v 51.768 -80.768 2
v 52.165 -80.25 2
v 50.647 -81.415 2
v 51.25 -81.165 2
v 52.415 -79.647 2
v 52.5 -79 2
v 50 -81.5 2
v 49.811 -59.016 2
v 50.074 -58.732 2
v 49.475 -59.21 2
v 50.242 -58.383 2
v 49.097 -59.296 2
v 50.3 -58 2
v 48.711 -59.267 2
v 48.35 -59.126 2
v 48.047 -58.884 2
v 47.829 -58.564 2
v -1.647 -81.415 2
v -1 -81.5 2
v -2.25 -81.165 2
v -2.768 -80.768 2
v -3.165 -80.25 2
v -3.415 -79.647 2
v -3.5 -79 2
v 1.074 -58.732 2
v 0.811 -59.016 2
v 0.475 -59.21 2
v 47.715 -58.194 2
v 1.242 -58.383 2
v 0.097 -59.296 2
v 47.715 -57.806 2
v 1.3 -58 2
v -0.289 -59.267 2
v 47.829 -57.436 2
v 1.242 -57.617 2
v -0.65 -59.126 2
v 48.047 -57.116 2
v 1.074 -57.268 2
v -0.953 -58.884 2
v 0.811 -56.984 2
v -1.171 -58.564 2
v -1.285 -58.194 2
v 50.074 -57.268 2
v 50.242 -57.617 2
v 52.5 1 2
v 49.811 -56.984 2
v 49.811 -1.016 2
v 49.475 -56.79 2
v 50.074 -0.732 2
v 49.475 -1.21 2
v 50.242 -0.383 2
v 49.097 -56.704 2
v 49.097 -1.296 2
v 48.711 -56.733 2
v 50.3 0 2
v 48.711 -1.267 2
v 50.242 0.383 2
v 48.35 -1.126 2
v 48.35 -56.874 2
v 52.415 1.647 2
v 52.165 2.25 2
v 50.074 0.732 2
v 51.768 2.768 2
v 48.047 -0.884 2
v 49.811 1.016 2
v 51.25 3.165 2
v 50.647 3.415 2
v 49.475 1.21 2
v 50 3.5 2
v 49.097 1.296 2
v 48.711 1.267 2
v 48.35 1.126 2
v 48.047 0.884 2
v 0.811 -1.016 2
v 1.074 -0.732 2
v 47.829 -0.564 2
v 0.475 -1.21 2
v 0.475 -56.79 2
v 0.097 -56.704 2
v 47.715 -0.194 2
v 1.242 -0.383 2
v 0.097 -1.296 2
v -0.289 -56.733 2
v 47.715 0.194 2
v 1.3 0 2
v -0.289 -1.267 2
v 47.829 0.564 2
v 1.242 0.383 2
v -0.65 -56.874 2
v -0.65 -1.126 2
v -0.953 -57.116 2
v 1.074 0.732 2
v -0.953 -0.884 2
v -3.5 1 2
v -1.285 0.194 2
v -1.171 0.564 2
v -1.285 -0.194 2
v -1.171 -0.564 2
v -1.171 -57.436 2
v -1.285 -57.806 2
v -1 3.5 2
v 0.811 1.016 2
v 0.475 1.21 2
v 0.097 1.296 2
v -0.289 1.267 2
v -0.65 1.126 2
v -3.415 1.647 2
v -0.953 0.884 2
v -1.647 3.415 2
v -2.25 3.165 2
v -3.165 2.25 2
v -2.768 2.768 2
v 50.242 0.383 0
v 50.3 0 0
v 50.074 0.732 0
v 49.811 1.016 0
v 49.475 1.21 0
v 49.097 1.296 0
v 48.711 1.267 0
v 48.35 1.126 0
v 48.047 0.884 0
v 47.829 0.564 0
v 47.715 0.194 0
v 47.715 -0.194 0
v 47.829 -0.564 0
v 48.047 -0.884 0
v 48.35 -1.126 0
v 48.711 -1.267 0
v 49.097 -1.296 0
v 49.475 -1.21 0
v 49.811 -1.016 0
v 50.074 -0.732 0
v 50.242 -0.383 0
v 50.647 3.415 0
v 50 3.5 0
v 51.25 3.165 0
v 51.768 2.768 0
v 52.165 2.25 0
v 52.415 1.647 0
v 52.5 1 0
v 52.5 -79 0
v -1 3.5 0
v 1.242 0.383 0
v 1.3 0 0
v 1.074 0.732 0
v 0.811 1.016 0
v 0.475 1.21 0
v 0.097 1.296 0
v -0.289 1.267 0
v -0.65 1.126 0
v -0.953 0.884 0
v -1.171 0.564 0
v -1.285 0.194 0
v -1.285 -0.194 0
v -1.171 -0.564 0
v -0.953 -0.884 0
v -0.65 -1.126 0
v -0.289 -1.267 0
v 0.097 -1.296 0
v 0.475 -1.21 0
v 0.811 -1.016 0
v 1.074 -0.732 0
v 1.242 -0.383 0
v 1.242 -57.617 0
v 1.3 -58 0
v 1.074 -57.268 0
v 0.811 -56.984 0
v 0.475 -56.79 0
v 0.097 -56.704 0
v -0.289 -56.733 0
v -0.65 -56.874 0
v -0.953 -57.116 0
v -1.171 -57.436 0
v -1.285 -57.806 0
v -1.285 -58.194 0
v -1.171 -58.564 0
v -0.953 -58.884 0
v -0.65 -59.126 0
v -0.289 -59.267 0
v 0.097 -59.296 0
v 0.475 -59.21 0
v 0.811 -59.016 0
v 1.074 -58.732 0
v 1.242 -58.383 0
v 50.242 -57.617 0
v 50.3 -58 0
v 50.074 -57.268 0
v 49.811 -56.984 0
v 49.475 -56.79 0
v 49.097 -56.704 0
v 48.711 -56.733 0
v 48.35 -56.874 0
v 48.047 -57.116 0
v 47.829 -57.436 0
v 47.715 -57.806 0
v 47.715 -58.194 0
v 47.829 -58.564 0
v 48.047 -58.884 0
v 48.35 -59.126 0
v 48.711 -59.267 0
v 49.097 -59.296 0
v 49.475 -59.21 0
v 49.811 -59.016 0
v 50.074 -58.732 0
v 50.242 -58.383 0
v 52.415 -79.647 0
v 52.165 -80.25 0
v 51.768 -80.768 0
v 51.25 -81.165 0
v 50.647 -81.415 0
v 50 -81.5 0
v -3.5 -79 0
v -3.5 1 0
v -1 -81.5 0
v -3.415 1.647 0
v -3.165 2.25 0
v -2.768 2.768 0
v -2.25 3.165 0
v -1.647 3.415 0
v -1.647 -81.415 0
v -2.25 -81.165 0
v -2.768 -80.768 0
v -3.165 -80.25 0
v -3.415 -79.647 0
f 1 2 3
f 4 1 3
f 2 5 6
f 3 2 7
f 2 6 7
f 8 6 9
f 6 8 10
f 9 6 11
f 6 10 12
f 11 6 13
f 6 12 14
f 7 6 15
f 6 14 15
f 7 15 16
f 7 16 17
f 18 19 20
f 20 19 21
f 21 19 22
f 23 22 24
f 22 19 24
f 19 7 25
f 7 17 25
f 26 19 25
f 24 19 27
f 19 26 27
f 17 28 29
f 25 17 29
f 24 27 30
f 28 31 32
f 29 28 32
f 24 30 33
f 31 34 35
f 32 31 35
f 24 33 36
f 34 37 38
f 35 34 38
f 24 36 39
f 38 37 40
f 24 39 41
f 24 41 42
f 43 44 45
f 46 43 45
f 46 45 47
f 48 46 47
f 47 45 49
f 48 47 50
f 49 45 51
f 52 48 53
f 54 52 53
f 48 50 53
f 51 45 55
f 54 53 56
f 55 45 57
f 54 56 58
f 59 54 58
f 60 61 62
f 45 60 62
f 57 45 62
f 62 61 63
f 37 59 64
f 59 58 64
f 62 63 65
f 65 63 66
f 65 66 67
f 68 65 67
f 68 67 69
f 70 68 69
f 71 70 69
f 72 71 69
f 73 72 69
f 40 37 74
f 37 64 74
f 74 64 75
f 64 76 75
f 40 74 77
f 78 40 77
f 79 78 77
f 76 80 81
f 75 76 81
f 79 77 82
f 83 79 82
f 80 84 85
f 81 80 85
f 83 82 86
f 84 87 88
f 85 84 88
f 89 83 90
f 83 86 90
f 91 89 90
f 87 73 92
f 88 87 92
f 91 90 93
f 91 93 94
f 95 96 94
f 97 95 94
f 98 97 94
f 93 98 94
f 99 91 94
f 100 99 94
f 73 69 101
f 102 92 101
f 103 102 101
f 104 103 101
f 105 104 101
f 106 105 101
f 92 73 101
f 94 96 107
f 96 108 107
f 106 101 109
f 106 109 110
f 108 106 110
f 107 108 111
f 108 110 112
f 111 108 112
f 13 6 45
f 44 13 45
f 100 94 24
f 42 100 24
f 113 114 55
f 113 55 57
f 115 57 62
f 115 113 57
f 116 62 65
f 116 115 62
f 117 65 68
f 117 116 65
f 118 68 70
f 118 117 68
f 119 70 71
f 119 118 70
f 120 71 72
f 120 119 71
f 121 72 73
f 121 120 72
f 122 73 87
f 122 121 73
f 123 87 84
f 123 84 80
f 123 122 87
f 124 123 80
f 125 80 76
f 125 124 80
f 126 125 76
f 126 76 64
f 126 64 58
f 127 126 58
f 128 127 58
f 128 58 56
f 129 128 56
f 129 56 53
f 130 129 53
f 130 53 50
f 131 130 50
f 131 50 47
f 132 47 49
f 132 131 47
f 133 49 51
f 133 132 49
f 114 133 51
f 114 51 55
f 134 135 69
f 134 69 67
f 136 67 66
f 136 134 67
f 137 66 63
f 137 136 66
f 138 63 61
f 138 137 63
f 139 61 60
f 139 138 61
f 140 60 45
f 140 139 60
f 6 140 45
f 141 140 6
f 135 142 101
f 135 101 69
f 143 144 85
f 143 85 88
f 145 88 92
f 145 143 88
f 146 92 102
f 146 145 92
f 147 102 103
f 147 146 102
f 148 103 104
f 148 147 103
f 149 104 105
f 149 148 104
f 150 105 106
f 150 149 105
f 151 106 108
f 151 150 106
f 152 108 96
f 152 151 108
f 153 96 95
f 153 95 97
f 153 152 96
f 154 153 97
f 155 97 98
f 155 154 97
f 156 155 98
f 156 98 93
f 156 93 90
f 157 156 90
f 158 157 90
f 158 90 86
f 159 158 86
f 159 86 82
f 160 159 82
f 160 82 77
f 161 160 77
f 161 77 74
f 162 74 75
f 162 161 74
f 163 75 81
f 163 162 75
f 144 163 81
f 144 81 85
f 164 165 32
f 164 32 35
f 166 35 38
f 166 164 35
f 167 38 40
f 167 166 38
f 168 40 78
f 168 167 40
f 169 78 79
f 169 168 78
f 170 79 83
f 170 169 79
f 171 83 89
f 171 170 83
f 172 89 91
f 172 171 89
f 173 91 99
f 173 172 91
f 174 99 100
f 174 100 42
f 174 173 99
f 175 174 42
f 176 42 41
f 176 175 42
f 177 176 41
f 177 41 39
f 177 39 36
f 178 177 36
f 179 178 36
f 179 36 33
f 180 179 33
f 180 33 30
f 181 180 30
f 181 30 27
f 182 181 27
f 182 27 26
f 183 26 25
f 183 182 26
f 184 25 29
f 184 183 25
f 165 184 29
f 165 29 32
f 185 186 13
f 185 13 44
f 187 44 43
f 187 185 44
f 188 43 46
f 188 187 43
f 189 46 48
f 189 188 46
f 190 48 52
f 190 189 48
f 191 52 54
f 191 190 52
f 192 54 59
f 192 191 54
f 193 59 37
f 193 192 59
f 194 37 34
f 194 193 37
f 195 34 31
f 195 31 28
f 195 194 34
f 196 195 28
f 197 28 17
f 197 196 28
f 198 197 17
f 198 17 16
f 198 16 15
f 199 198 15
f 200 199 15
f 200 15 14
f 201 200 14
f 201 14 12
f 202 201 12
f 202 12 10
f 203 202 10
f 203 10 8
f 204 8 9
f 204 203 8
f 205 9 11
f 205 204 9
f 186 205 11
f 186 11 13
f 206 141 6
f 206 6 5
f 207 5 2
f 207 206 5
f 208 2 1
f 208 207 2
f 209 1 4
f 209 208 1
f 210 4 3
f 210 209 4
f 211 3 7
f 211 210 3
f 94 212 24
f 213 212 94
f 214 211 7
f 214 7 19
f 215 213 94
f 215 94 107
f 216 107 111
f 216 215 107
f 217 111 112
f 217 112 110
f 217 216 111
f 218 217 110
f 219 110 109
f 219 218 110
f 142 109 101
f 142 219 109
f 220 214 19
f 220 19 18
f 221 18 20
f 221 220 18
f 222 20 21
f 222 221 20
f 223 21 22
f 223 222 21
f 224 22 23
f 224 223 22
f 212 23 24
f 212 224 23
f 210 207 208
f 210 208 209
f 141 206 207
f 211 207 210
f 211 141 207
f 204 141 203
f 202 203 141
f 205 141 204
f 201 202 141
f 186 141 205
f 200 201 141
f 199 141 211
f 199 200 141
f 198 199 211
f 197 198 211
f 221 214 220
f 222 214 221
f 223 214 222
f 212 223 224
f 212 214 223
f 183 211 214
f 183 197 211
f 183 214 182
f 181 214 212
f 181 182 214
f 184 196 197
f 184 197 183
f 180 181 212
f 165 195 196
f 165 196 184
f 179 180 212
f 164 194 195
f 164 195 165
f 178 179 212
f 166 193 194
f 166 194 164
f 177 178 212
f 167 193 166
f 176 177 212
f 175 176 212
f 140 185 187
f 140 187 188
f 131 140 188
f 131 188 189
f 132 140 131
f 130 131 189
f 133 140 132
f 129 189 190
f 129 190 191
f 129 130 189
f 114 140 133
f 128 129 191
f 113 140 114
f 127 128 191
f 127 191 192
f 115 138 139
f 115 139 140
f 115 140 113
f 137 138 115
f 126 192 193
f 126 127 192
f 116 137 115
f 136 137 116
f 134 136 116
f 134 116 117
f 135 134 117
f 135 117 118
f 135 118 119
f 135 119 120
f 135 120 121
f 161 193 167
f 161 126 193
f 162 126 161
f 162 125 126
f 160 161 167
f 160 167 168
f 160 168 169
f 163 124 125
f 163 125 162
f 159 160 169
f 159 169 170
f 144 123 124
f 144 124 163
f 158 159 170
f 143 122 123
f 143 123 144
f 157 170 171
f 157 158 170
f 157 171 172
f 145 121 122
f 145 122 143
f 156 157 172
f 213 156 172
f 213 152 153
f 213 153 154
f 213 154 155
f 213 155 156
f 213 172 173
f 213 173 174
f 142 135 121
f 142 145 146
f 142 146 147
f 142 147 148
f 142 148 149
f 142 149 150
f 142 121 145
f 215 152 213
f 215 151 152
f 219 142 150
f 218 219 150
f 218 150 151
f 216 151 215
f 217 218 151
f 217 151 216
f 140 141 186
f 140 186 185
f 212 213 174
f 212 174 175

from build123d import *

# Parameters (mm, degrees)
SKETCH_1_R      = 1.3
EXTRUDE_1_DEPTH = 2


with BuildPart() as part:
    # 草图1 → 凸台-拉伸1 (new body)
    with BuildSketch(Plane.XY):
        with BuildLine():
            Line((-1, 3.5), (50, 3.5))
            ThreePointArc((50, 3.5), (51.767766953, 2.767766953), (52.5, 1))
            Line((52.5, 1), (52.5, -79))
            ThreePointArc((52.5, -79), (51.767766953, -80.767766953), (50, -81.5))
            Line((50, -81.5), (-1, -81.5))
            ThreePointArc((-1, -81.5), (-2.767766953, -80.767766953), (-3.5, -79))
            Line((-3.5, -79), (-3.5, 1))
            ThreePointArc((-3.5, 1), (-2.767766953, 2.767766953), (-1, 3.5))
        make_face()
        with Locations((49, 0)):
            Circle(SKETCH_1_R, mode=Mode.SUBTRACT)
        with Locations((49, -58)):
            Circle(SKETCH_1_R, mode=Mode.SUBTRACT)
        with Locations((0, -58)):
            Circle(SKETCH_1_R, mode=Mode.SUBTRACT)
        Circle(SKETCH_1_R, mode=Mode.SUBTRACT)
    extrude(amount=EXTRUDE_1_DEPTH)


solid = part.part
